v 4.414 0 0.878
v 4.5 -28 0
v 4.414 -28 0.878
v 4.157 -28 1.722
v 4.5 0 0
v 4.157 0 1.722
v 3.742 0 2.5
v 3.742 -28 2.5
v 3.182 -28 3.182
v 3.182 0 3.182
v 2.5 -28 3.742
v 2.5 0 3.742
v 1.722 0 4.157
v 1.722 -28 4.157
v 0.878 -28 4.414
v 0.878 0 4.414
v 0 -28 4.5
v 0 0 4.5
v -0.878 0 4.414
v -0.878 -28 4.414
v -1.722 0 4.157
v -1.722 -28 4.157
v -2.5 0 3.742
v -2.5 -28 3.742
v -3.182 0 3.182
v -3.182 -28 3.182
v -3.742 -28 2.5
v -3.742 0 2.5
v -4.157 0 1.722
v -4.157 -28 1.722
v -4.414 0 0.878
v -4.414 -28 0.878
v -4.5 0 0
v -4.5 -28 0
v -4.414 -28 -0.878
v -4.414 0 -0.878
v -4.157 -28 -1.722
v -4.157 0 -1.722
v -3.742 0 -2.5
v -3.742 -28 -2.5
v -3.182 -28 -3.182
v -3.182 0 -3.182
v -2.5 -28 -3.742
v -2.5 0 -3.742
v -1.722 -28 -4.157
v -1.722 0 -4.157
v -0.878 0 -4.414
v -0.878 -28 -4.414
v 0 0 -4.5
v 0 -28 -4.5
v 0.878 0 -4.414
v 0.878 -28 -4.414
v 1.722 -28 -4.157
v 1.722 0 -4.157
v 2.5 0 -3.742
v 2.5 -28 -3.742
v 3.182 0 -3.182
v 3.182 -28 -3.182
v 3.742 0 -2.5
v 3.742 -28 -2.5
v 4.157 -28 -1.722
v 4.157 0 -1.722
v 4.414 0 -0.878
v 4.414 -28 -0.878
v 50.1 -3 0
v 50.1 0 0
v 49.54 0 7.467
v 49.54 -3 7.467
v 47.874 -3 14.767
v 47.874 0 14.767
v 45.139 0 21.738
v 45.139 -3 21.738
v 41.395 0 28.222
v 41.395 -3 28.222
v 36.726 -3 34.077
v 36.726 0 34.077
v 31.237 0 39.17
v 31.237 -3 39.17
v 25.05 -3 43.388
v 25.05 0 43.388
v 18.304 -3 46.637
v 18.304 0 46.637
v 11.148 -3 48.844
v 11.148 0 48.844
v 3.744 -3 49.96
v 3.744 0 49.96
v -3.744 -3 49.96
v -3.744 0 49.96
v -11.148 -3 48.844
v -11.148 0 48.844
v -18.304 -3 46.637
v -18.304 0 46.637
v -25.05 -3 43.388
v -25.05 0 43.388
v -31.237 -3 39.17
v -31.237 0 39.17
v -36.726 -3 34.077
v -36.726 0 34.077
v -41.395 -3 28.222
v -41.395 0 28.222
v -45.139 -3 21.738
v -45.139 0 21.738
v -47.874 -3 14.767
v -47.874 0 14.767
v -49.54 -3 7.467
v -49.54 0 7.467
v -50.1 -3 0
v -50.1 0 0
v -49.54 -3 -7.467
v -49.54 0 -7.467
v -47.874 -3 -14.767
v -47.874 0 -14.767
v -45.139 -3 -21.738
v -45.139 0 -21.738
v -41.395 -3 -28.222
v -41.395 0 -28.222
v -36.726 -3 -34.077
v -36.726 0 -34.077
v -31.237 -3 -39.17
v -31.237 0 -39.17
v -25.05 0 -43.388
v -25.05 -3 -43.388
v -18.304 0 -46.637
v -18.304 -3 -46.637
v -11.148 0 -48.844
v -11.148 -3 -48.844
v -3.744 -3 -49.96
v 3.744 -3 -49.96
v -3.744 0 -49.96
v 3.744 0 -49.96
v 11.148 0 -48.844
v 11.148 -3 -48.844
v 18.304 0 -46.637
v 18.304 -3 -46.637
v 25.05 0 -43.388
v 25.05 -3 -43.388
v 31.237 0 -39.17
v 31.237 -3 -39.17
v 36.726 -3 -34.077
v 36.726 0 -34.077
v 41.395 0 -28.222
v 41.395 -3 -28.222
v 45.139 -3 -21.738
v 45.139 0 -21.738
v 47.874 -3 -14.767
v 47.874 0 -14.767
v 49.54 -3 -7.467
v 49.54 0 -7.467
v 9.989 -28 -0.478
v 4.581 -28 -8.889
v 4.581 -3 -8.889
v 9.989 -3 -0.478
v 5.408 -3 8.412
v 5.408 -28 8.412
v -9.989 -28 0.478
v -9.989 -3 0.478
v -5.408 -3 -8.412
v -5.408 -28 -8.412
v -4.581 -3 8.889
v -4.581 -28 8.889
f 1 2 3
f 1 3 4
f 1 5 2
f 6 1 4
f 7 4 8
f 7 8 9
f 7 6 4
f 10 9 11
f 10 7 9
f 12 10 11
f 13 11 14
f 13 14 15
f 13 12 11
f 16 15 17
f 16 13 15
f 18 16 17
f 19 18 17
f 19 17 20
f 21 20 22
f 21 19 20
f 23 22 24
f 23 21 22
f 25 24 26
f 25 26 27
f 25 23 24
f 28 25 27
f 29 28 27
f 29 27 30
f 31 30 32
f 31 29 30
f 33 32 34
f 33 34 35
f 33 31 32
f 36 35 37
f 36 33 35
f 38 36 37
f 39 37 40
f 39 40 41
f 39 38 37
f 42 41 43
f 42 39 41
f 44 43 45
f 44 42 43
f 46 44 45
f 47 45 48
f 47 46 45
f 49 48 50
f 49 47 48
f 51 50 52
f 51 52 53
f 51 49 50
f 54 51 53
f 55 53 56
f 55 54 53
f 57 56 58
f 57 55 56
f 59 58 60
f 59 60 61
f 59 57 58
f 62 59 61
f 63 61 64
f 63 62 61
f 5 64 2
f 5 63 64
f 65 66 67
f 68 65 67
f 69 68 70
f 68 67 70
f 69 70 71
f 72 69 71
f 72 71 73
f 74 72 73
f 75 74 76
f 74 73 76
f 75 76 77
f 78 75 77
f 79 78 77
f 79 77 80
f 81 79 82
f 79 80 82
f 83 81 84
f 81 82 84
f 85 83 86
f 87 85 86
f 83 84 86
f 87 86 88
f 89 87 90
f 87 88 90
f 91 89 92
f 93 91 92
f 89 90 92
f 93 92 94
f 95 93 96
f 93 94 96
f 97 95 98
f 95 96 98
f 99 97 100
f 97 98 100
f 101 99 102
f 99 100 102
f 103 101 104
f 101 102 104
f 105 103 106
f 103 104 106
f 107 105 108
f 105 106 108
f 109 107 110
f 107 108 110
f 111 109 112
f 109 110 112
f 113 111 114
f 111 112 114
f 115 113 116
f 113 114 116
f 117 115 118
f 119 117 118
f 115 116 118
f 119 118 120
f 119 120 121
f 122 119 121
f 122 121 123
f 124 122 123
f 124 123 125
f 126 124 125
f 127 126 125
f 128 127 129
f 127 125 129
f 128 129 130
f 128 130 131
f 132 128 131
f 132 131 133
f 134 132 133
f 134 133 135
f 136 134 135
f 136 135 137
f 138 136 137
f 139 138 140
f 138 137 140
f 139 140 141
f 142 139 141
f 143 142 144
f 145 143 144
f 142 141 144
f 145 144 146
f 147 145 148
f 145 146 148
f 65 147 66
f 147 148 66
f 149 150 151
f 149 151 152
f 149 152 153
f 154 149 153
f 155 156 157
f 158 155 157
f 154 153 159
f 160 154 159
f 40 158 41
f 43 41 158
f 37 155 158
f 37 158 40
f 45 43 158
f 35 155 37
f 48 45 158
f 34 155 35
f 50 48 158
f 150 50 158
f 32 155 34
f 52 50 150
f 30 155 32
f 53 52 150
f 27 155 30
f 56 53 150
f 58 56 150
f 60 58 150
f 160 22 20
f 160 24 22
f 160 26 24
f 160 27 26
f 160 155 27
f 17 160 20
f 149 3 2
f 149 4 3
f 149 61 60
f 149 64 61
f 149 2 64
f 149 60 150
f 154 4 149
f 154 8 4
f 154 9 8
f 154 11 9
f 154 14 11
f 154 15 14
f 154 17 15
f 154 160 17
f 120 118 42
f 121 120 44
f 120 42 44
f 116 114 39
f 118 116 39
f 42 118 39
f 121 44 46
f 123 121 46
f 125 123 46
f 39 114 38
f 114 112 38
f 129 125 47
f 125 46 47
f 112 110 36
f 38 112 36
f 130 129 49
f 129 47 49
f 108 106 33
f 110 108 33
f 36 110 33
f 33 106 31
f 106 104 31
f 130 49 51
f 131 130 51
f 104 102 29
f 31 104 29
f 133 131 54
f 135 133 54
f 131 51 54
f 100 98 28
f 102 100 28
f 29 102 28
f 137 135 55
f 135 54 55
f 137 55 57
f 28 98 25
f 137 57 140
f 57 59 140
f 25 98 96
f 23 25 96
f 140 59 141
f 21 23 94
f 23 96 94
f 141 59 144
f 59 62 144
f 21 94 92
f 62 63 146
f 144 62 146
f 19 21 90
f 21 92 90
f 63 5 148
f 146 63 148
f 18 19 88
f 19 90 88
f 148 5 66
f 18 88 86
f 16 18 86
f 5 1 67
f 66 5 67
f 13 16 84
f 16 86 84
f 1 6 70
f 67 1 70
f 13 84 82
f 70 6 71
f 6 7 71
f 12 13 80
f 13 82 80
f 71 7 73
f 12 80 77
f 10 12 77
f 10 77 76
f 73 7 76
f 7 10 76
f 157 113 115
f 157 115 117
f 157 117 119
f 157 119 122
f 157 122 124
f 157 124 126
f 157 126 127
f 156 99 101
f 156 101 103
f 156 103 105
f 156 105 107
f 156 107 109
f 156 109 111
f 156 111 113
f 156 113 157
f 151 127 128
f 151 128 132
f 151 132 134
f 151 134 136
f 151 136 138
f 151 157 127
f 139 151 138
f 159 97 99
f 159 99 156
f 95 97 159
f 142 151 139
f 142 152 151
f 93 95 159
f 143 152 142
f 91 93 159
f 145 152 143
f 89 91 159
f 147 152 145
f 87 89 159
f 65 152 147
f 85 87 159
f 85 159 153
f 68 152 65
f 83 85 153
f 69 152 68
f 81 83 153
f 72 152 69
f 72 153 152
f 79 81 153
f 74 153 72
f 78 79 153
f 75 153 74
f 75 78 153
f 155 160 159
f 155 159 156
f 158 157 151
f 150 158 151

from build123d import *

# Parameters (mm, degrees)
F0_R     = 50.1
F0_R_2   = 4.5
F1_DEPTH = 3
F2_R     = 4.5
F3_DEPTH = 25


with BuildPart() as f1:
    # F0 (on Front) → F1 (new body)
    with BuildSketch(Plane.XZ):
        Circle(F0_R)
        Circle(F0_R_2, mode=Mode.SUBTRACT)
    extrude(amount=F1_DEPTH)

    # F2 (on face) → F3 (join)
    with BuildSketch(Plane.XZ.offset(3)):
        Polygon((-4.58071, 8.889156), (-9.98859, 0.477567), (-5.40788, -8.411589), (4.58071, -8.889156), (9.98859, -0.477567), (5.40788, 8.411589), align=None)
        Circle(F2_R, mode=Mode.SUBTRACT)
    extrude(amount=F3_DEPTH)


solid = f1.part
